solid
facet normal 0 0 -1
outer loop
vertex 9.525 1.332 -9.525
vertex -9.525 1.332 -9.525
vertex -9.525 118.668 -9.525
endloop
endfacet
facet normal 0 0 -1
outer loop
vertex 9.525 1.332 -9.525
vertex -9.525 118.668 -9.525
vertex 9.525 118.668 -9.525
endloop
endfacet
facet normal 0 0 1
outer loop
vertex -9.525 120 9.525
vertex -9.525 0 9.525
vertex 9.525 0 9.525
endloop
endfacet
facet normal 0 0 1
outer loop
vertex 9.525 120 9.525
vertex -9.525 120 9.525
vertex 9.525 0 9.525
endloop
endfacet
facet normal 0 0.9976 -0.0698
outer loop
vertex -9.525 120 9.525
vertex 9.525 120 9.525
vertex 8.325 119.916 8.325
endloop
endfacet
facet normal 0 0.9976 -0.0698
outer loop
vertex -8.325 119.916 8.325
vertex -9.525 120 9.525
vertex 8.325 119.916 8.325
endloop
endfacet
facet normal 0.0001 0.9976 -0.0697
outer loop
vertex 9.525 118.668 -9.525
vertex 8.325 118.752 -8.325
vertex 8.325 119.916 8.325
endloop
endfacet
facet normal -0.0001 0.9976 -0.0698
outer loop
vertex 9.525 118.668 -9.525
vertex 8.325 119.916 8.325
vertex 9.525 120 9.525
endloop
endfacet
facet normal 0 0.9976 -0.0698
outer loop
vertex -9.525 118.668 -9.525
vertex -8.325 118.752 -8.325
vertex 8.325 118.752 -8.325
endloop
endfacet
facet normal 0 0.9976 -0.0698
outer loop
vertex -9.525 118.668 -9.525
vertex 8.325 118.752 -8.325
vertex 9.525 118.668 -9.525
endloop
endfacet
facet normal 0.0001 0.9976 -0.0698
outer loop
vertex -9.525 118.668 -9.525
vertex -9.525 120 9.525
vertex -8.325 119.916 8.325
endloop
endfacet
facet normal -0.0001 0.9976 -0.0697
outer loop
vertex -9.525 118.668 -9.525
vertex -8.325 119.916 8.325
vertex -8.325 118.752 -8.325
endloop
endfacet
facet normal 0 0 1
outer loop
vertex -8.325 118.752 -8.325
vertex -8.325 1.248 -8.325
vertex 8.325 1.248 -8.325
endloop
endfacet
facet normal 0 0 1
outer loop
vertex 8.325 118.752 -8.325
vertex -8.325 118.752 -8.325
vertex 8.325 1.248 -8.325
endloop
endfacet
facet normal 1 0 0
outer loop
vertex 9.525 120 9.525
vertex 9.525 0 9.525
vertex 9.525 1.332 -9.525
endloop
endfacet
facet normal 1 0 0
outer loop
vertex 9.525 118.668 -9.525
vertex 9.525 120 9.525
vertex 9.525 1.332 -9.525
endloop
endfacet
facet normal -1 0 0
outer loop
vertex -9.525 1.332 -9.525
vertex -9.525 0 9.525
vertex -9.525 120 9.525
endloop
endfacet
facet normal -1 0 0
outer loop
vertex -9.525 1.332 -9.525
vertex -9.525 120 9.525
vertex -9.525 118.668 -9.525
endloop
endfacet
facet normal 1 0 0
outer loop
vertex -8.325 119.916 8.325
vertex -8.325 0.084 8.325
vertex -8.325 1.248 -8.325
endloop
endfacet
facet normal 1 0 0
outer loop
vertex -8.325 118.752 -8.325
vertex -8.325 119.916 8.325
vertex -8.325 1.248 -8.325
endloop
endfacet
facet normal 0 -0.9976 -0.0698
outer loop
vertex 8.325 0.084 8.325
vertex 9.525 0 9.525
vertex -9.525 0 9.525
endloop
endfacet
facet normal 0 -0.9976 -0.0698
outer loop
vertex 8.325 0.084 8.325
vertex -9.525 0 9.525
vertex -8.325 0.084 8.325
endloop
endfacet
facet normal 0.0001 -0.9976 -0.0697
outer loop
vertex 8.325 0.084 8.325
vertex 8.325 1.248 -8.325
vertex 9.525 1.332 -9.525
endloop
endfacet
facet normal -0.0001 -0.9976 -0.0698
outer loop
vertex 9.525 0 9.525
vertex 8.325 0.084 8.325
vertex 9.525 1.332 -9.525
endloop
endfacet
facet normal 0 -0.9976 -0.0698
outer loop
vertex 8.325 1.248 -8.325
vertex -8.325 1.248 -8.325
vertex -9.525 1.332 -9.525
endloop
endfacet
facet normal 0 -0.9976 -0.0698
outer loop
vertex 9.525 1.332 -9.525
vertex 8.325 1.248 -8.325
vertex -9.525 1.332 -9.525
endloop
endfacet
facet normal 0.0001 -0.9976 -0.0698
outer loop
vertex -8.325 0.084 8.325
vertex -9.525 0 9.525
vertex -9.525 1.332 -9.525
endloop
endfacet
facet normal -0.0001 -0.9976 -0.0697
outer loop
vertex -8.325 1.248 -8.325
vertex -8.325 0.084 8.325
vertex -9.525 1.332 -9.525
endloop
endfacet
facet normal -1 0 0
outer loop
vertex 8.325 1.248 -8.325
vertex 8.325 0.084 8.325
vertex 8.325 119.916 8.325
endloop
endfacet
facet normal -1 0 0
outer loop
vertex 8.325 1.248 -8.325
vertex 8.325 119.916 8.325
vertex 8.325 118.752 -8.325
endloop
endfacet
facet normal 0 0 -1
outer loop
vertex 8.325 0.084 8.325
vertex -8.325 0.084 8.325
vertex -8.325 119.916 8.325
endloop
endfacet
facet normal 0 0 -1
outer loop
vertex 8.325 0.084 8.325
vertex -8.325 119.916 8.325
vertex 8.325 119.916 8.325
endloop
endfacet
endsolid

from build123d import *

# Parameters (mm, degrees)
SKETCH1_W               = 19.05
SKETCH1_H               = 19.05
BOSS_EXTRUDE1_DEPTH     = 120
SKETCH2_W               = 16.65
SKETCH2_H               = 16.65
CUT_EXTRUDE3_DEPTH      = 121.753680068
CUT_EXTRUDE4_DEPTH      = 121.753680068
CUT_EXTRUDE4_DEPTH_BACK = 121.753680068


with BuildPart() as part:
    # Sketch1 → Boss-Extrude1 (new body)
    with BuildSketch(Plane(origin=(0, 0, 0), x_dir=(1, 0, 0), z_dir=(0, 1, 0))):
        Rectangle(SKETCH1_W, SKETCH1_H)
    extrude(amount=BOSS_EXTRUDE1_DEPTH)

    # Sketch2 → Cut-Extrude3 (cut, through all)
    with BuildSketch(Plane(origin=(0, 0, 0), x_dir=(1, 0, 0), z_dir=(0, 1, 0))):
        Rectangle(SKETCH2_W, SKETCH2_H)
    extrude(amount=CUT_EXTRUDE3_DEPTH, mode=Mode.SUBTRACT)

    # Sketch3 → Cut-Extrude4 (cut, two sides: drawn at the far end of the back side and taken through both)
    with BuildSketch(Plane(origin=(0, 0, 0), x_dir=(0, 0, -1), z_dir=(1, 0, 0)).offset(-CUT_EXTRUDE4_DEPTH_BACK)):
        Polygon((-9.525, 120), (9.525, 118.667894232), (9.525, 120), align=None)
        Polygon((9.525, 0), (-9.525, 0), (9.525, 1.332105768), align=None)
    extrude(amount=CUT_EXTRUDE4_DEPTH + CUT_EXTRUDE4_DEPTH_BACK, mode=Mode.SUBTRACT)


solid = part.part
